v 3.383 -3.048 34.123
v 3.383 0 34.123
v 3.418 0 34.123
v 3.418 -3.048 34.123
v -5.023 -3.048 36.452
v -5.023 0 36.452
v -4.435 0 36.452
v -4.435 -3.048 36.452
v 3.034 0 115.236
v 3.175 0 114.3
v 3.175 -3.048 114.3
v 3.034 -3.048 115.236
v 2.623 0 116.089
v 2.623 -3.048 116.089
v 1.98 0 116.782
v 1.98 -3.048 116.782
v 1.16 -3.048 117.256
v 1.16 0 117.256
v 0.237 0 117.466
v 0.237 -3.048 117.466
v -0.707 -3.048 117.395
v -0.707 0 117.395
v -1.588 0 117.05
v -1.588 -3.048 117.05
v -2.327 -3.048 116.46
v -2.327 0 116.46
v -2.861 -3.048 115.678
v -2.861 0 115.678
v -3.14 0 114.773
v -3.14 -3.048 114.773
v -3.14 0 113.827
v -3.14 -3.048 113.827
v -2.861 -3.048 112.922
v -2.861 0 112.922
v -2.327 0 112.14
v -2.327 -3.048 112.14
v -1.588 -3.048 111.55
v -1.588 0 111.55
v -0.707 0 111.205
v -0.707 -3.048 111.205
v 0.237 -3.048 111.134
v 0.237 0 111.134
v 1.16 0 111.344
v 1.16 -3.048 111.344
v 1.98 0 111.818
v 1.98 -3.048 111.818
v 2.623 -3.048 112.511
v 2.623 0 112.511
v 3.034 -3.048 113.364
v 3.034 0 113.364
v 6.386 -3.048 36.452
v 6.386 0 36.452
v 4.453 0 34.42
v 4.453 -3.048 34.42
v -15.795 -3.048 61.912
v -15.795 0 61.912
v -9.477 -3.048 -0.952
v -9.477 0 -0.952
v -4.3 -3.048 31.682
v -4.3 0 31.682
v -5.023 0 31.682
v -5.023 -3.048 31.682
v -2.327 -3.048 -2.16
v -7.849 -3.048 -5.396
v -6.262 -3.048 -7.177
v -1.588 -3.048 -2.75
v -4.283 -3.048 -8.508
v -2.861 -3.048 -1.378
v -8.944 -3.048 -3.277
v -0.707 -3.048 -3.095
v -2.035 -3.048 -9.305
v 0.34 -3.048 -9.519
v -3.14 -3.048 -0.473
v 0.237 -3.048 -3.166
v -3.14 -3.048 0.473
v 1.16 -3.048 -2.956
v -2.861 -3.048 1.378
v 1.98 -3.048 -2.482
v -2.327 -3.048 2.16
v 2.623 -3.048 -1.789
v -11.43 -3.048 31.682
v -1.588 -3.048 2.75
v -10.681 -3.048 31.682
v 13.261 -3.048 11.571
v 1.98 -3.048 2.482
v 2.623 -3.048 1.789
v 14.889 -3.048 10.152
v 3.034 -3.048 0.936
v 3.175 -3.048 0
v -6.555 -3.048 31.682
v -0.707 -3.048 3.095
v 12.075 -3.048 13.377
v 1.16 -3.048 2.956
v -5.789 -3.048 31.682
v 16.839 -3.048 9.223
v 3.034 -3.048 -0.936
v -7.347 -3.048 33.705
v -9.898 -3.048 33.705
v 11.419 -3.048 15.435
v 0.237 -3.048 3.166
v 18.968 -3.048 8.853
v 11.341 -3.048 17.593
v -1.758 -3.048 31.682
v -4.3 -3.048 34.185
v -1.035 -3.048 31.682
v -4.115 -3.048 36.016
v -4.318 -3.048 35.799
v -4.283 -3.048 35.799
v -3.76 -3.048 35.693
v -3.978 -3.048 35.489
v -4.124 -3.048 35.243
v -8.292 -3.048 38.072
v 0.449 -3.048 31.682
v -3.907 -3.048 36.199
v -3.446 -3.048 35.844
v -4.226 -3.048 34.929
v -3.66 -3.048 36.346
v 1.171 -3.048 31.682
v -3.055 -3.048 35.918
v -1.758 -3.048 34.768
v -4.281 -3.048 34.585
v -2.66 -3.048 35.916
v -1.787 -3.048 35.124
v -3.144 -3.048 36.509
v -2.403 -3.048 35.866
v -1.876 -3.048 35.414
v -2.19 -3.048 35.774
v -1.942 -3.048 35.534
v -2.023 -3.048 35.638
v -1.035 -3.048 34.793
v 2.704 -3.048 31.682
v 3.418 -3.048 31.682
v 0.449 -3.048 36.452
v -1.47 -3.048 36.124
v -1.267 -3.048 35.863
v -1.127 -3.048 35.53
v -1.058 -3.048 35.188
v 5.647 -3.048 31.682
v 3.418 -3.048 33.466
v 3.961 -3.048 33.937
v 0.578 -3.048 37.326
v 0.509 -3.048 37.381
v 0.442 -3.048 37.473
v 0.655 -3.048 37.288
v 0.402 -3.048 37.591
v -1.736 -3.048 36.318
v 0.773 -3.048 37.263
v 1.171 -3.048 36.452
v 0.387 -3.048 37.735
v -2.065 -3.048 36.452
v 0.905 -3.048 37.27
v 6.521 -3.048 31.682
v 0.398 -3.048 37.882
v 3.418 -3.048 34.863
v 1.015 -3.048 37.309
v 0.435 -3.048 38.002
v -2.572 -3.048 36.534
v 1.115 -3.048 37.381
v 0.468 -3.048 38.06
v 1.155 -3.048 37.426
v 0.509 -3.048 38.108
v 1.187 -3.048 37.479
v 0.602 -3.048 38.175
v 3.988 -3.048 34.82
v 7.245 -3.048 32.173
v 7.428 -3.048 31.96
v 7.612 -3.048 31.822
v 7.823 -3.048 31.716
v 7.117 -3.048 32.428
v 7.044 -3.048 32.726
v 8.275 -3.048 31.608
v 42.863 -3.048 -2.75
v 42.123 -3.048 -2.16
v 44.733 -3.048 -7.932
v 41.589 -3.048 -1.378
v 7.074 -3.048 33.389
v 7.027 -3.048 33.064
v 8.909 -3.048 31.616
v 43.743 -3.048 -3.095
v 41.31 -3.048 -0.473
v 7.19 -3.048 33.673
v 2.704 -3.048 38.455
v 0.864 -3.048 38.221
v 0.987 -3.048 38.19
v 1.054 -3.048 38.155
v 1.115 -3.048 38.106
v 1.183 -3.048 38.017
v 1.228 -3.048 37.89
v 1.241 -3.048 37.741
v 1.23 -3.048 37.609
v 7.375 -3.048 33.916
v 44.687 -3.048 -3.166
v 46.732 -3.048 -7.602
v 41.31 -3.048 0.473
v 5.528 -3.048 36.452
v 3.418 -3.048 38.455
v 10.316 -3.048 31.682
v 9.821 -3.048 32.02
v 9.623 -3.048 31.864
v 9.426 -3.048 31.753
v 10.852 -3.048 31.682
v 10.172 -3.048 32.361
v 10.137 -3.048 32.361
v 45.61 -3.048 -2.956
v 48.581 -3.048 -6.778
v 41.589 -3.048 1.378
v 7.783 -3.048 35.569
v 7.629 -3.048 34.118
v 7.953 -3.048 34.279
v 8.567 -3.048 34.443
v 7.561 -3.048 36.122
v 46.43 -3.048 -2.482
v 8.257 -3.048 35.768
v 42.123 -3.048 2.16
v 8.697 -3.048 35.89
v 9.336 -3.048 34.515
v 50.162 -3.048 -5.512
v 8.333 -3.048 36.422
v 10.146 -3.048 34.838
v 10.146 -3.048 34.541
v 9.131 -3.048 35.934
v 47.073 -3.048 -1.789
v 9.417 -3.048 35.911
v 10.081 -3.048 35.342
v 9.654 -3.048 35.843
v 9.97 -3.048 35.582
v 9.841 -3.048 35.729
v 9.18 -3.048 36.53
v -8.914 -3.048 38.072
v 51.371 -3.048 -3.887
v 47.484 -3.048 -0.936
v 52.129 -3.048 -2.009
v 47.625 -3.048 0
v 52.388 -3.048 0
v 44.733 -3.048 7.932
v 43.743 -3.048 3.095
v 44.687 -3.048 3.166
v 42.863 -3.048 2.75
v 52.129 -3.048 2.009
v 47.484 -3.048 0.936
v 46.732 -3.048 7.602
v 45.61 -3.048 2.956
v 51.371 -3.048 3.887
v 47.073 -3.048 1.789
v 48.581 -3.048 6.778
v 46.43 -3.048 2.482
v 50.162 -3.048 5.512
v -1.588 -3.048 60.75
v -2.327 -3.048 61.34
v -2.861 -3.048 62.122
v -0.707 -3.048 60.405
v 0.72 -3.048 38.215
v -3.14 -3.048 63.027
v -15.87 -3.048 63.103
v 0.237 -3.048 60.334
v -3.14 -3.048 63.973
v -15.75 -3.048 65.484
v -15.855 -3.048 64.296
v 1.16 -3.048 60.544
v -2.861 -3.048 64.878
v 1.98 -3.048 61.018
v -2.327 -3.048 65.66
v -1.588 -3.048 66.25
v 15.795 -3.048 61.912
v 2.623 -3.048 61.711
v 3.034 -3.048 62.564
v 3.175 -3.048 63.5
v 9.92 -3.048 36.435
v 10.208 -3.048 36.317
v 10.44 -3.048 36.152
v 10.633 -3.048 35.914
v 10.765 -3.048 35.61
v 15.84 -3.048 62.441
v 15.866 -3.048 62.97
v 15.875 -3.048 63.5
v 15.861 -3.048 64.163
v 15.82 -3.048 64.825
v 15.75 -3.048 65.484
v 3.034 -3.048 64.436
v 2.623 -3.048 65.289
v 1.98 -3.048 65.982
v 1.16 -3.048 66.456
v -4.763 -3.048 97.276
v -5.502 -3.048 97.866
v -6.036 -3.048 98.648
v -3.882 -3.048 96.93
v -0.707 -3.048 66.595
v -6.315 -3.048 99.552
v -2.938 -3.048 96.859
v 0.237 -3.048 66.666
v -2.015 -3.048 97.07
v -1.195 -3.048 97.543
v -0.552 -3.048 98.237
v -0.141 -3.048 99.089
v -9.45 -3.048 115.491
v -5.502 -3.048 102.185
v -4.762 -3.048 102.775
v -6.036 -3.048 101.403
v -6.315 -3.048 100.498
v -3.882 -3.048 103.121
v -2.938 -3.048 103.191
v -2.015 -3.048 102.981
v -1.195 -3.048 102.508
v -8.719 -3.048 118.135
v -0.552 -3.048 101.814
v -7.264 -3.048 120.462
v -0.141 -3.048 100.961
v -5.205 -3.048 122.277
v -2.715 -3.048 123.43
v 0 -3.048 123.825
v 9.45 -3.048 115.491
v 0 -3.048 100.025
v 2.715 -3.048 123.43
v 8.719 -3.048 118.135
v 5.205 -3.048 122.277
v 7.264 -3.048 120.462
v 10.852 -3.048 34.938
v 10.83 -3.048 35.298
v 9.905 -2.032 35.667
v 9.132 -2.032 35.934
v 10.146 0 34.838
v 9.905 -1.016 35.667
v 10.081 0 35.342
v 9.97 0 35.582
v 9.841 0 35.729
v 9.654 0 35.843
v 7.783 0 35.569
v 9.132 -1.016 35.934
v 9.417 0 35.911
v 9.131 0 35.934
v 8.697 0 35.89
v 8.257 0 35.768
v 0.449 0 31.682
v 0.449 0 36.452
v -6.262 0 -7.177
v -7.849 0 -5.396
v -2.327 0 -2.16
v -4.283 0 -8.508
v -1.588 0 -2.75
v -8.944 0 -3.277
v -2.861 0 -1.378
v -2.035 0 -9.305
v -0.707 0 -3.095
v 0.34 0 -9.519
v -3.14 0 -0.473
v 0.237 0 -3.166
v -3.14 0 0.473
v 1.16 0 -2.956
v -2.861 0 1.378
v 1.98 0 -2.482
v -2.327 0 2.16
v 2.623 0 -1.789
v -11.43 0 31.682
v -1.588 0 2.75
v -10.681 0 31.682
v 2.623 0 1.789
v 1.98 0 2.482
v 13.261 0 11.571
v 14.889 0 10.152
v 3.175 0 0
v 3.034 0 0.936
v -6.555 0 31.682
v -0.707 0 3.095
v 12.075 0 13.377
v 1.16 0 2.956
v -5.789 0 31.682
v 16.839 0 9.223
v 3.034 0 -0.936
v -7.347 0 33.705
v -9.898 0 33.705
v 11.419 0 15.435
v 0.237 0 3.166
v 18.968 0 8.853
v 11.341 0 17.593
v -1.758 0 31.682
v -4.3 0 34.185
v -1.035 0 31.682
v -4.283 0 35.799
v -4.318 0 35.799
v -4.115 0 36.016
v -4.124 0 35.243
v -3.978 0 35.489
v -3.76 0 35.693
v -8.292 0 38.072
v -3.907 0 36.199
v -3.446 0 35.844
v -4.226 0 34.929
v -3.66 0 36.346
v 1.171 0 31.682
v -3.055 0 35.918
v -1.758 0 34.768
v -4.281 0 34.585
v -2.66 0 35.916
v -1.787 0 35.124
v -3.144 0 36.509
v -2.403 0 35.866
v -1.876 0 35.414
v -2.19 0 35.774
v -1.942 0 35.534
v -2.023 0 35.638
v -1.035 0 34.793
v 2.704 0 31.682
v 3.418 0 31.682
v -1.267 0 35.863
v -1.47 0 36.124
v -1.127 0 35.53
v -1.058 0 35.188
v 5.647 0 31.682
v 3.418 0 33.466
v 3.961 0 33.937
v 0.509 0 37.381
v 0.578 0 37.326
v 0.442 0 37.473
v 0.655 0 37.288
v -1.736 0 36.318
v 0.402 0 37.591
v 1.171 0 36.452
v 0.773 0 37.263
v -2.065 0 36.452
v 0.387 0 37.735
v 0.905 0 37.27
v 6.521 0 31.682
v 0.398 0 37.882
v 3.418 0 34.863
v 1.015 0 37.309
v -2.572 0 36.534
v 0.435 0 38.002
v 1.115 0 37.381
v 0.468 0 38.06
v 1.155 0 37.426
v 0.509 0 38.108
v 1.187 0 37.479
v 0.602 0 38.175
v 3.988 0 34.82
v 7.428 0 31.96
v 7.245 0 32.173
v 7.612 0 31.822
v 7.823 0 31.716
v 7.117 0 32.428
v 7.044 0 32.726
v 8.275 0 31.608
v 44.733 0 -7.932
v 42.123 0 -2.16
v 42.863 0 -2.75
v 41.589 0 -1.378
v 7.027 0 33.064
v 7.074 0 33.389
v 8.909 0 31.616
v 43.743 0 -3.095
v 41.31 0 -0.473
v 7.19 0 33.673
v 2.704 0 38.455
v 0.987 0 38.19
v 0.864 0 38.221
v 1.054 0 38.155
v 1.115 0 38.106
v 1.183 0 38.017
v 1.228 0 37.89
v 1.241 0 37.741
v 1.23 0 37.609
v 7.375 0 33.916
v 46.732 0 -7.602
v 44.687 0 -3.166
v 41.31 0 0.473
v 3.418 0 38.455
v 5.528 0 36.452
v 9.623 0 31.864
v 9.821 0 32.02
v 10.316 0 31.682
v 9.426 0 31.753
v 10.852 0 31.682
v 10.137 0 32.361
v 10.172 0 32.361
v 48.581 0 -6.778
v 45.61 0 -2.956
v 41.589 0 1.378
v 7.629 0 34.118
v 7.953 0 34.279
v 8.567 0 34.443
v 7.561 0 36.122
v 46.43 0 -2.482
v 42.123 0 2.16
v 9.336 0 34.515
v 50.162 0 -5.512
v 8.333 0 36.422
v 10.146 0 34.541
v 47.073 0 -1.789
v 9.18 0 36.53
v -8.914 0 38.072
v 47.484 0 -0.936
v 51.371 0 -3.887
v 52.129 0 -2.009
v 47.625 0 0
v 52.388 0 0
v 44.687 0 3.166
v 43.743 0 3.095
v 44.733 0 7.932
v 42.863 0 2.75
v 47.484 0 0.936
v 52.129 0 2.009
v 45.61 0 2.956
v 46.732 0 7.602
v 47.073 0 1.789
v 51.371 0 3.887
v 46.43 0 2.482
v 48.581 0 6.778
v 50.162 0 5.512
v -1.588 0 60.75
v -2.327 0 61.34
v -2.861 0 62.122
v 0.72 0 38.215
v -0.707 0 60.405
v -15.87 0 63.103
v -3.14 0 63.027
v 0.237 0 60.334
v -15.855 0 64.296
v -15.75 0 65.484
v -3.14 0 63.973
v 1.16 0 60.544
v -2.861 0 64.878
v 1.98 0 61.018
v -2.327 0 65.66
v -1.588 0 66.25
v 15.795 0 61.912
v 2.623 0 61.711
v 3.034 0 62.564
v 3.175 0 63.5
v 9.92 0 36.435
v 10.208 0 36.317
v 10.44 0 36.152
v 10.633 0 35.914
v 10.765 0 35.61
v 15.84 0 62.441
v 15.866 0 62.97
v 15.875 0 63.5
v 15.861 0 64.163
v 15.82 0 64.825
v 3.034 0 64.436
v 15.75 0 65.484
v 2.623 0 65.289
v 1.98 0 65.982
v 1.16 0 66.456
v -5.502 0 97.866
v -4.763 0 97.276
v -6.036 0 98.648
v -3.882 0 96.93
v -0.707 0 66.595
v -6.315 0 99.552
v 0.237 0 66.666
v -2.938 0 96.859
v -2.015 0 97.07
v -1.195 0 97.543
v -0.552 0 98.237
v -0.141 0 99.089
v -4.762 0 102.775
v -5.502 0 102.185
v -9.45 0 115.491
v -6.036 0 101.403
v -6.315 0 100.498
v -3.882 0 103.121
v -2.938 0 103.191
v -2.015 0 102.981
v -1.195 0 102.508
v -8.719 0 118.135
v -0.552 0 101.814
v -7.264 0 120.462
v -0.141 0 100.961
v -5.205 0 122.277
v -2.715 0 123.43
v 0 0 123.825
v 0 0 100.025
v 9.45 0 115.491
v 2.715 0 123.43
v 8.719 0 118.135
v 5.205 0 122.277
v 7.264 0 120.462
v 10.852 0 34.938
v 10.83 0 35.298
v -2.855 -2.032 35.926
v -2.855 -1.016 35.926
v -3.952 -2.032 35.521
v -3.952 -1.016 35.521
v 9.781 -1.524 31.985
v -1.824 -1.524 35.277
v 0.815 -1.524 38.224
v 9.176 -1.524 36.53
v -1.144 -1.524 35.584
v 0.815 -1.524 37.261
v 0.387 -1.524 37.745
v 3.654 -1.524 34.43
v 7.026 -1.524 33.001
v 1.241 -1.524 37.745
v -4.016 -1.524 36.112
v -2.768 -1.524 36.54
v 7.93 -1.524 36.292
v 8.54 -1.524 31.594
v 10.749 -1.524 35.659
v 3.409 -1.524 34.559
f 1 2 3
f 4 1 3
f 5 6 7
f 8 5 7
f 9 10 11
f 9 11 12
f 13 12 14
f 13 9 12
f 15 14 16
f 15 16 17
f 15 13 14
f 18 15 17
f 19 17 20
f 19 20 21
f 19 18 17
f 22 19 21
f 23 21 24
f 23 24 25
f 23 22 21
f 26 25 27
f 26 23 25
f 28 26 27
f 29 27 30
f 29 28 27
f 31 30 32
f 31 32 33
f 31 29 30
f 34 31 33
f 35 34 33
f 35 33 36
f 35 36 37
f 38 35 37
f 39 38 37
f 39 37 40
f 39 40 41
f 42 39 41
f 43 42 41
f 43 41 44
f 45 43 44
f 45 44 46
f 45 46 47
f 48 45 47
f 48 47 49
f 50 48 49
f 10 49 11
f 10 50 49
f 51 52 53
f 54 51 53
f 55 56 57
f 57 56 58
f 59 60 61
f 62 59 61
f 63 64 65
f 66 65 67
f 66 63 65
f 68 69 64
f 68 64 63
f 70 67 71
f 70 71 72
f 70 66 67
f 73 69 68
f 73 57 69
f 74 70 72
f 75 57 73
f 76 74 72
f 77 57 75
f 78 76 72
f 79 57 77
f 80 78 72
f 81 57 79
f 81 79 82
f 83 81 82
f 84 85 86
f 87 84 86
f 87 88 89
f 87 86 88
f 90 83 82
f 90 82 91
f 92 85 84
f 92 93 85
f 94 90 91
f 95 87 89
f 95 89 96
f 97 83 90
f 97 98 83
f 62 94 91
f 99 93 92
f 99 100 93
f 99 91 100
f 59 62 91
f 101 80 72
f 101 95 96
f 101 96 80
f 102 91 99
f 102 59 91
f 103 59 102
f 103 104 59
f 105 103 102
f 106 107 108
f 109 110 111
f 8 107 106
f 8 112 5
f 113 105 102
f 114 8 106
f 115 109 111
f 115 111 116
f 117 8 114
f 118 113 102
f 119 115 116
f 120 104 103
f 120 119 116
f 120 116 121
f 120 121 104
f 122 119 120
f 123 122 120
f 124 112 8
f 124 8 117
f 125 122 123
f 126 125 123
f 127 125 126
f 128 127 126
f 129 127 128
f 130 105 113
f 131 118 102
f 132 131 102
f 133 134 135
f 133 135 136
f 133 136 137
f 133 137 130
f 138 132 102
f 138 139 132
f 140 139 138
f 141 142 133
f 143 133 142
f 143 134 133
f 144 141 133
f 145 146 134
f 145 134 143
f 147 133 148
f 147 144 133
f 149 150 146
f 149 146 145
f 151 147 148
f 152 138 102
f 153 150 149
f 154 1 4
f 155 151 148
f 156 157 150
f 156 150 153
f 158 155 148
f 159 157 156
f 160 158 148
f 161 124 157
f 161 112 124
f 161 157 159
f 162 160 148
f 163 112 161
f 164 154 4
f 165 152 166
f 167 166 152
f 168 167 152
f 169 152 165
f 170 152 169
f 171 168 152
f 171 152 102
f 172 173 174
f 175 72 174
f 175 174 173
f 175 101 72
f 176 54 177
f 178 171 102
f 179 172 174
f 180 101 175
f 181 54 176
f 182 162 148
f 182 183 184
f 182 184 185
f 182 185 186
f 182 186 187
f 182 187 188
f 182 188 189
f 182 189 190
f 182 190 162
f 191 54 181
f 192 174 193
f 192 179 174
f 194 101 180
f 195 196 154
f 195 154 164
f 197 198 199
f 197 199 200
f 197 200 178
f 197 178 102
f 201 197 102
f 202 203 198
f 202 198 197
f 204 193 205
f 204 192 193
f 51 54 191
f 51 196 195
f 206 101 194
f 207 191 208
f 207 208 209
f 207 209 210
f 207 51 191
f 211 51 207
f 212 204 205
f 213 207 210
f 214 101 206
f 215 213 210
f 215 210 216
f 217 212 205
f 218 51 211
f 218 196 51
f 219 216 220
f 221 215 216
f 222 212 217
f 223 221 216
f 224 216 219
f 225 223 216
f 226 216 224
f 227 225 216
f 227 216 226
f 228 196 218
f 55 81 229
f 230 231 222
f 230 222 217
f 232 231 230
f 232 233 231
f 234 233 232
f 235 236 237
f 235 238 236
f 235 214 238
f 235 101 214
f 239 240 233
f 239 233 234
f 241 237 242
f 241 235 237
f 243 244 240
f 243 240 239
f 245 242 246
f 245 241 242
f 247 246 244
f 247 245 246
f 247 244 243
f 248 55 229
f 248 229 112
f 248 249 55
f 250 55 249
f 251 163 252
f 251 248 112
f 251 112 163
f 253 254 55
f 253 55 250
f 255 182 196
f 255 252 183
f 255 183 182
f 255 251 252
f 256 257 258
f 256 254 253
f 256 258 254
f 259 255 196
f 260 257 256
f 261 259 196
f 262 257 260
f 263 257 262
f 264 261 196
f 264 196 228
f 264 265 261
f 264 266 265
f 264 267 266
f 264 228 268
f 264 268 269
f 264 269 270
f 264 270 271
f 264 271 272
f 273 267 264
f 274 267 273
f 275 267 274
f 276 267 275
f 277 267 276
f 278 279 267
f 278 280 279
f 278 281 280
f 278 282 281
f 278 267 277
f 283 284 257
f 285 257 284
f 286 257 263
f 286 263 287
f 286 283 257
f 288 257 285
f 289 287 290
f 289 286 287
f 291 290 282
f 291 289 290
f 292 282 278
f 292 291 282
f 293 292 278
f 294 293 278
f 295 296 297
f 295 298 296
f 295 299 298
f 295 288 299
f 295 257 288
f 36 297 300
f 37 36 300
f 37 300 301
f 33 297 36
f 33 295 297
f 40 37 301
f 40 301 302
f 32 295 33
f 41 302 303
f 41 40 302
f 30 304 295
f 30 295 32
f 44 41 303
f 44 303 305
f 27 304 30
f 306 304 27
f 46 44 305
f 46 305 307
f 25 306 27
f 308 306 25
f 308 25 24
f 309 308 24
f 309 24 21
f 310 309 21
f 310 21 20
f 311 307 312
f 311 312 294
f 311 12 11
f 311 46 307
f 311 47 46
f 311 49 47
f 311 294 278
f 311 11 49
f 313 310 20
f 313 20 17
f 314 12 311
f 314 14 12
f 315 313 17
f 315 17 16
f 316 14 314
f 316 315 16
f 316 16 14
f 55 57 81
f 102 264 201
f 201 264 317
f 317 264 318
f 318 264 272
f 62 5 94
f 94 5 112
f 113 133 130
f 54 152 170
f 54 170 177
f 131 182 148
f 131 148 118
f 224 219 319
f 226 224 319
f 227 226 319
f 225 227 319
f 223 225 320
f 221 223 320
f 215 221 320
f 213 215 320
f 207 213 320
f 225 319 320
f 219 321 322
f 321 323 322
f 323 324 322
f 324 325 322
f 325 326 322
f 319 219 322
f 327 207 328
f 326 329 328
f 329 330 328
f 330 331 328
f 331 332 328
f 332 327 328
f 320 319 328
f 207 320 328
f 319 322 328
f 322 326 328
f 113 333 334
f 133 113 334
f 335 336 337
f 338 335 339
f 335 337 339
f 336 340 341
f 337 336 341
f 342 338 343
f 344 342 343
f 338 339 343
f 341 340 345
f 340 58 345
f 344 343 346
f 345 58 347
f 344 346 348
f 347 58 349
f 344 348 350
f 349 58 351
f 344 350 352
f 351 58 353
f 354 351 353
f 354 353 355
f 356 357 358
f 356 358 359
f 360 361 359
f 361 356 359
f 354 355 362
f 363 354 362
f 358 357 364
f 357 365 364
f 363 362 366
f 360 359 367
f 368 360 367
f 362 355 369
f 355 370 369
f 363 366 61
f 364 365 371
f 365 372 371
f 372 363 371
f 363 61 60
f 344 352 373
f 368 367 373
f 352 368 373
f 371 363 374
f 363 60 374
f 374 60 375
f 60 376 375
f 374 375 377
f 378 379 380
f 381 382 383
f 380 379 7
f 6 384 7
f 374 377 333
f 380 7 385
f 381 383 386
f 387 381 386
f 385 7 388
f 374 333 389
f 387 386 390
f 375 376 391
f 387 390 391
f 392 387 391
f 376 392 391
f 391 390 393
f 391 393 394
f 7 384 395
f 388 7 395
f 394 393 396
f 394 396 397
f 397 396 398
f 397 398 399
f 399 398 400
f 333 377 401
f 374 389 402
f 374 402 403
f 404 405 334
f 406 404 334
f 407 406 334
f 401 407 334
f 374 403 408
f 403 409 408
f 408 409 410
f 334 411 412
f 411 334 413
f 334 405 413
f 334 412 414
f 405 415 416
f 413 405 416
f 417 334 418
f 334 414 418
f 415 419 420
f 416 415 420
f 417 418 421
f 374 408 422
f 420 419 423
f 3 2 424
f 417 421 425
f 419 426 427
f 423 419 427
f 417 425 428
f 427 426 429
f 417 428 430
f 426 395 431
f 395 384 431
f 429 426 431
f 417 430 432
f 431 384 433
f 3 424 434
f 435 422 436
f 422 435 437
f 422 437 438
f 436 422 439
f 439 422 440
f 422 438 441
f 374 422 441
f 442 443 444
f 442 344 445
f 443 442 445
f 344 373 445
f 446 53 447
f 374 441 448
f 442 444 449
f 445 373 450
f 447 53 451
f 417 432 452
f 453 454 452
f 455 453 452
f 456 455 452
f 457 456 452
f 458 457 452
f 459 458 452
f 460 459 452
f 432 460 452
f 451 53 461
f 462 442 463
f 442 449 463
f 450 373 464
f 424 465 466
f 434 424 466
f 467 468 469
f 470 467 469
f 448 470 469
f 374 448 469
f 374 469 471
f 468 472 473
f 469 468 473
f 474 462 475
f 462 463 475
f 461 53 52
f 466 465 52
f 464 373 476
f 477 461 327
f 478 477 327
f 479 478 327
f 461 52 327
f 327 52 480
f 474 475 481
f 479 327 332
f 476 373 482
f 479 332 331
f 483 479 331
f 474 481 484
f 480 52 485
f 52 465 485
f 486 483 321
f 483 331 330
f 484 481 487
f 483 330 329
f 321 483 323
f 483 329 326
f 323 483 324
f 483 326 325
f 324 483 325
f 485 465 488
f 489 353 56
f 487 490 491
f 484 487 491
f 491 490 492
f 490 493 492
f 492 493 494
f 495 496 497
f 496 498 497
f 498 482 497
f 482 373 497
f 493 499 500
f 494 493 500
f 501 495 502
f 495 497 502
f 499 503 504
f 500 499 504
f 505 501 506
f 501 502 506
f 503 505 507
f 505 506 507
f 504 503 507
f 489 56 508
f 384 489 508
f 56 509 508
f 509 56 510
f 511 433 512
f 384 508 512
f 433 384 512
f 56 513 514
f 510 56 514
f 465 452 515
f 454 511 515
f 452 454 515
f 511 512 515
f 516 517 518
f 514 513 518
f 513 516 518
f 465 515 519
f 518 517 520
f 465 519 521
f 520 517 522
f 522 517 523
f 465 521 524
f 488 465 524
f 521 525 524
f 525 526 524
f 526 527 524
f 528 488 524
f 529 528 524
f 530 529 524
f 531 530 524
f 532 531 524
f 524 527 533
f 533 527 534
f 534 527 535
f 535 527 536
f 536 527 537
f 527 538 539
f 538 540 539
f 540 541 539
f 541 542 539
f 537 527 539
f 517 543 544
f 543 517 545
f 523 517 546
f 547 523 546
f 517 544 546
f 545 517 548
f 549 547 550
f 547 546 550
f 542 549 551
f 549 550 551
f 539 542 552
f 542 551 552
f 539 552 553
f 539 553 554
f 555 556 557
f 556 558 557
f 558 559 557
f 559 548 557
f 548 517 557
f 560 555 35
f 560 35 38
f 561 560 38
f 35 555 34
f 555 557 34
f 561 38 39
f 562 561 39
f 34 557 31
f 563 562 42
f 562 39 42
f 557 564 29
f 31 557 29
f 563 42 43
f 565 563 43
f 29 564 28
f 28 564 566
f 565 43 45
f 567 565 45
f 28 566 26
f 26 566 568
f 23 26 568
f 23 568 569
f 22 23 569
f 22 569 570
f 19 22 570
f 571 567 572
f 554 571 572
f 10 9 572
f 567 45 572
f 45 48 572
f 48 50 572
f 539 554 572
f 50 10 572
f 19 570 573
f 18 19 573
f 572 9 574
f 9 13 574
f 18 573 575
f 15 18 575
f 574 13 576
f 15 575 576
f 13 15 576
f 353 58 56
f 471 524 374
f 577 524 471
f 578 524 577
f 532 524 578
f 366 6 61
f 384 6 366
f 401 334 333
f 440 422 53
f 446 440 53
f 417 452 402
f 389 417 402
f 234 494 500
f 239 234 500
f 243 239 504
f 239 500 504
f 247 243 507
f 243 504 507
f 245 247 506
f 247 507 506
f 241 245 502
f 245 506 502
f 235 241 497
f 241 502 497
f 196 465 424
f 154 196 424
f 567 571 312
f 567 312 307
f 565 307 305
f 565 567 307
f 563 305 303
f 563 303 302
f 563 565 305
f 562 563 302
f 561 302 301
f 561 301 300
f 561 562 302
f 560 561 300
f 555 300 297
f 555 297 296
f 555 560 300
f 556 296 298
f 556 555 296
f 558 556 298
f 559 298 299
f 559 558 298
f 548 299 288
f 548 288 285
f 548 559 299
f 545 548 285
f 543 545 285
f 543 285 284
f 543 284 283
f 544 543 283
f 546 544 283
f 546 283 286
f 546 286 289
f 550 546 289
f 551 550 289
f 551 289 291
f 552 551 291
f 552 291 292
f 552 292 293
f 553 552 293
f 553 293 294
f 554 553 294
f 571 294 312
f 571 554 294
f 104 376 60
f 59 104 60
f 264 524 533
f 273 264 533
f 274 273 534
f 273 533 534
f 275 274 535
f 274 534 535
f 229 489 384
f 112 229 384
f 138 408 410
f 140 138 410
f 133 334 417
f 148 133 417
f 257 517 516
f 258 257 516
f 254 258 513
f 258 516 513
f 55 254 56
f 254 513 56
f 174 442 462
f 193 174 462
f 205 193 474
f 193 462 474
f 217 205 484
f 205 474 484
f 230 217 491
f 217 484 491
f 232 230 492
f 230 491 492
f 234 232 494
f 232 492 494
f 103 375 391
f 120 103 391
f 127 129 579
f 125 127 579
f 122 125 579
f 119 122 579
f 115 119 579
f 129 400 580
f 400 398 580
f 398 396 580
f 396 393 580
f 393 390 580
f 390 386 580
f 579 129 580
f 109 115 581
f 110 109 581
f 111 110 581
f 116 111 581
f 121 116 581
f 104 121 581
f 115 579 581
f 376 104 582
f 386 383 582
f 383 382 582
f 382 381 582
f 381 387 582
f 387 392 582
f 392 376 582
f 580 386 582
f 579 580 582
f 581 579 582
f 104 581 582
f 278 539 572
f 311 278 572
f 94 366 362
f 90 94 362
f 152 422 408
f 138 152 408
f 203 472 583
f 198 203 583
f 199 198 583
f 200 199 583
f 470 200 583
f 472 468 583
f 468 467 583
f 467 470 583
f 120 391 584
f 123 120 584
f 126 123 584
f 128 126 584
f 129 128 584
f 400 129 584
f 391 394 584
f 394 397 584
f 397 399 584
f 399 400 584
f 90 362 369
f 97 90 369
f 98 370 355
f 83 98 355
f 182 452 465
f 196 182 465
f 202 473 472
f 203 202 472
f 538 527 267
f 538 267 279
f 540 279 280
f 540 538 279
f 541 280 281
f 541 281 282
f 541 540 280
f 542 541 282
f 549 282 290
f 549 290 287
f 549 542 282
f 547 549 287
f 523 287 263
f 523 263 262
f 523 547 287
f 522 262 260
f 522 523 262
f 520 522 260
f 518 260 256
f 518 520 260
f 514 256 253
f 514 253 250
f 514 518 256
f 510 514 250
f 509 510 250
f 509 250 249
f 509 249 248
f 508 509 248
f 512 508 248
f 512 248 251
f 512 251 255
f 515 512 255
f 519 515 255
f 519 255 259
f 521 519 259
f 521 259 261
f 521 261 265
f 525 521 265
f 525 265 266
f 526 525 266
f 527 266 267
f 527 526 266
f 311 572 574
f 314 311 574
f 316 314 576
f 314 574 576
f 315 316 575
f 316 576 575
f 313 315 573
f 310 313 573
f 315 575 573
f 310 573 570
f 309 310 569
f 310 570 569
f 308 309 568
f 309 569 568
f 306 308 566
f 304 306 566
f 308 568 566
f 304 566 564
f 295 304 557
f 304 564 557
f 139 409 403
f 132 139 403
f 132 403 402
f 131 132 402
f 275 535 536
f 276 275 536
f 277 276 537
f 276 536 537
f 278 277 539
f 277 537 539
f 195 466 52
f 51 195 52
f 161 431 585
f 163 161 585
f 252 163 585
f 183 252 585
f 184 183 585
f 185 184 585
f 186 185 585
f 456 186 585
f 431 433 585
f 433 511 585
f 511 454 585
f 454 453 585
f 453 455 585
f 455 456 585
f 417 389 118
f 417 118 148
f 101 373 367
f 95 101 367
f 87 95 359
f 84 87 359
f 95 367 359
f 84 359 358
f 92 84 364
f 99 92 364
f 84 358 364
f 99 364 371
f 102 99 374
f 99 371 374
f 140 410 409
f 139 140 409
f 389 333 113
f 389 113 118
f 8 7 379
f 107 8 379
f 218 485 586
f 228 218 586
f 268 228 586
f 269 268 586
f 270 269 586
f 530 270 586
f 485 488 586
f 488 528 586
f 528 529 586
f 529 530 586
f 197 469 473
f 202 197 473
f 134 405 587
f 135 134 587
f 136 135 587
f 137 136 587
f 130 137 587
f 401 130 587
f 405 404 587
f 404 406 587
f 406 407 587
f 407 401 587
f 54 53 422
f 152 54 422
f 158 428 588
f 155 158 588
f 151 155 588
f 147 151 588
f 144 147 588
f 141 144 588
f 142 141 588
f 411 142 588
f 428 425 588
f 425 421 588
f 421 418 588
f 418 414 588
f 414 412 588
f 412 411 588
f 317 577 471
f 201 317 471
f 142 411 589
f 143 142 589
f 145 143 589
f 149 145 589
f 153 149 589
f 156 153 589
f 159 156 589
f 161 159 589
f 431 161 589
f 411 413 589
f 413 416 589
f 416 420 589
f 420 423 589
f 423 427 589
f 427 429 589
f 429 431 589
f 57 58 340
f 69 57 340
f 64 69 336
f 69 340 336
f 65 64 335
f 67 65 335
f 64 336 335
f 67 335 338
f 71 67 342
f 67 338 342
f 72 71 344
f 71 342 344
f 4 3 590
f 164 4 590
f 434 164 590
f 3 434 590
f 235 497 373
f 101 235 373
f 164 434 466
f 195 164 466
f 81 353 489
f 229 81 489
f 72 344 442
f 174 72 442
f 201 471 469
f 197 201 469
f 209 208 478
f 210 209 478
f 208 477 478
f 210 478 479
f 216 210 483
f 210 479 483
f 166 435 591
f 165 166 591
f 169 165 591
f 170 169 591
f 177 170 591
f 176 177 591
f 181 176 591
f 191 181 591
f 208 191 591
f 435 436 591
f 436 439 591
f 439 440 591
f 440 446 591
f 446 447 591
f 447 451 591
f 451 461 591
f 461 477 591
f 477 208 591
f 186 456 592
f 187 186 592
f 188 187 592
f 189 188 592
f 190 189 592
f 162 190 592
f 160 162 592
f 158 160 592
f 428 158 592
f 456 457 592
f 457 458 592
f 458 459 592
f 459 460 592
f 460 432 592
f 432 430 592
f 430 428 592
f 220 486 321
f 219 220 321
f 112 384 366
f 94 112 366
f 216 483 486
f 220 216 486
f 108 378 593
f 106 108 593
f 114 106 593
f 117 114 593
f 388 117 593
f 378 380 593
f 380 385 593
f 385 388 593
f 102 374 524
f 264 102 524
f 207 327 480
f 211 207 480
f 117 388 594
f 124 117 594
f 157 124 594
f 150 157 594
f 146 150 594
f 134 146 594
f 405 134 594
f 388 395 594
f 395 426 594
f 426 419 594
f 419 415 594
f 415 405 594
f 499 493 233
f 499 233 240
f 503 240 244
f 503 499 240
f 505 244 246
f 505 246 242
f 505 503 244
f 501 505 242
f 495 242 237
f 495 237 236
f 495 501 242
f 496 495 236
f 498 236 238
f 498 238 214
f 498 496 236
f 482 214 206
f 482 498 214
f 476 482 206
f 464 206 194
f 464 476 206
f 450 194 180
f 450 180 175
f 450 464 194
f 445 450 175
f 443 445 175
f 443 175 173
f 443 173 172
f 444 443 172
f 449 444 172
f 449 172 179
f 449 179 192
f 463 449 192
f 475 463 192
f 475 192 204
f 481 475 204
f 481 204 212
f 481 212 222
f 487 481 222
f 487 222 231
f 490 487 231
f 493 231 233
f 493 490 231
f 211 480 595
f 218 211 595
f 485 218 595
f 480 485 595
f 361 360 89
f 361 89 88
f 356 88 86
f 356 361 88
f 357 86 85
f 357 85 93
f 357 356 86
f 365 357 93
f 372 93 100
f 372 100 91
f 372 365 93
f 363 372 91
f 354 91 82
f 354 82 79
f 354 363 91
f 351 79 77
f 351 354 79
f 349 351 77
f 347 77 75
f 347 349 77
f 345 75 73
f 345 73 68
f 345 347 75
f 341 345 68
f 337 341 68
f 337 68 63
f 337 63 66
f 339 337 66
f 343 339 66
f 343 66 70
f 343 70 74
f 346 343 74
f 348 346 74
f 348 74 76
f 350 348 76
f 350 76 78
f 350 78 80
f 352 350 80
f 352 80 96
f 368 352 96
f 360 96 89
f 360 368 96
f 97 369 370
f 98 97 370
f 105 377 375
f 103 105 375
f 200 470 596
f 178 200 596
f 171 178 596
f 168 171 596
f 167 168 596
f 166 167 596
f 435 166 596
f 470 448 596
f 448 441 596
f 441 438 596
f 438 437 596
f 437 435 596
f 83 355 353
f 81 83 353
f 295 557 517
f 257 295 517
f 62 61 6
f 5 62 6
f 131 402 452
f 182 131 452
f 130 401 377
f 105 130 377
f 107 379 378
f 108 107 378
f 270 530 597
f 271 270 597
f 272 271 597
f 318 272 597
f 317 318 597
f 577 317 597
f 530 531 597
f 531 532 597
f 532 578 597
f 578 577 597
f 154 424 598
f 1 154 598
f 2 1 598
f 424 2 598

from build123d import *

# Parameters (mm, degrees)
F0_R     = 3.175
F0_W     = 0.7229064099
F0_H     = 4.7706251523
F1_DEPTH = 3.048


with BuildPart() as f1:
    # F0 (on Front) → F1 (new body)
    with BuildSketch(Plane.XZ):
        with BuildLine():
            ThreePointArc((-9.4502929642, 115.490625), (-0.596483242, 104.7936951058), (9.525, 114.3))
            ThreePointArc((9.525, 114.3), (9.5063048942, 114.896483242), (9.4502929642, 115.490625))
            ThreePointArc((9.4502929642, 115.490625), (0, 123.825), (-9.4502929642, 115.490625))
        make_face()
        with Locations((0, 114.3)):
            Circle(F0_R, mode=Mode.SUBTRACT)
        with BuildLine():
            ThreePointArc((9.4502929642, 115.490625), (9.5063048942, 114.896483242), (9.525, 114.3))
            ThreePointArc((9.525, 114.3), (-0.596483242, 104.7936951058), (-9.4502929642, 115.490625))
            Line((-9.4502929642, 115.490625), (-15.7504882737, 65.484375))
            ThreePointArc((-15.7504882737, 65.484375), (0, 79.375), (15.7504882737, 65.484375))
            Line((15.7504882737, 65.484375), (9.4502929642, 115.490625))
        make_face()
        with Locations((-3.175, 100.0252)):
            Circle(F0_R, mode=Mode.SUBTRACT)
        with BuildLine():
            ThreePointArc((15.875, 63.5), (15.8438414904, 64.4941387366), (15.7504882737, 65.484375))
            ThreePointArc((15.7504882737, 65.484375), (0, 79.375), (-15.7504882737, 65.484375))
            ThreePointArc((-15.7504882737, 65.484375), (-15.8737438155, 63.6997054867), (-15.7954255641, 61.9125))
            ThreePointArc((-15.7954255641, 61.9125), (0, 47.625), (15.7954255641, 61.9125))
            ThreePointArc((15.7954255641, 61.9125), (15.8550939106, 62.7052534459), (15.875, 63.5))
        make_face()
        with Locations((0, 63.5)):
            Circle(F0_R, mode=Mode.SUBTRACT)
        with BuildLine():
            ThreePointArc((15.7954255641, 61.9125), (0, 47.625), (-15.7954255641, 61.9125))
            Line((-15.7954255641, 61.9125), (-9.4772553384, -0.9525))
            ThreePointArc((-9.4772553384, -0.9525), (-0.4768479324, 9.5130563464), (9.525, 0))
            ThreePointArc((9.525, 0), (6.8544082857, -6.6138273378), (0.3401785714, -9.5189234444))
            Line((0.3401785714, -9.5189234444), (44.7334821429, -7.9324362036))
            ThreePointArc((44.7334821429, -7.9324362036), (36.5125, 0), (44.7334821429, 7.9324362036))
            Line((44.7334821429, 7.9324362036), (18.9676000005, 8.8532337108))
            ThreePointArc((18.9676000005, 8.8532337108), (13.2611998974, 11.5713591498), (11.3411865923, 17.5933818124))
            Line((11.3411865923, 17.5933818124), (15.7954255641, 61.9125))
        make_face()
        Polygon((-5.7888228126, 31.6815939556), (-6.5549086035, 31.6815939556), (-7.3474591762, 33.7054533268), (-9.8978284182, 33.7054533268), (-10.6806288082, 31.6815939556), (-11.43, 31.6815939556), (-8.9144528394, 38.0721423349), (-8.2918340239, 38.0721423349), align=None, mode=Mode.SUBTRACT)
        with BuildLine():
            Line((-1.0349122593, 31.6815939556), (-1.7578186693, 31.6815939556))
            Line((-1.7578186693, 31.6815939556), (-1.7578186693, 34.7682232513))
            add(Edge.make_bspline(
                [(-1.7578186693, 34.7682232513), (-1.7578186693, 35.3504484524), (-2.0231629296, 35.6380788447)],
                knots=[0, 0, 0, 1, 1, 1], degree=2))
            add(Edge.make_bspline(
                [(-2.0231629296, 35.6380788447), (-2.2885071899, 35.9257092371), (-2.8554106751, 35.9257092371)],
                knots=[0, 0, 0, 1, 1, 1], degree=2))
            add(Edge.make_bspline(
                [(-2.8554106751, 35.9257092371), (-3.6033889837, 35.9257092371), (-3.9516097977, 35.5210766512)],
                knots=[0, 0, 0, 1, 1, 1], degree=2))
            add(Edge.make_bspline(
                [(-3.9516097977, 35.5210766512), (-4.2998306117, 35.1164440653), (-4.2998306117, 34.184605167)],
                knots=[0, 0, 0, 1, 1, 1], degree=2))
            Line((-4.2998306117, 34.184605167), (-4.2998306117, 31.6815939556))
            Line((-4.2998306117, 31.6815939556), (-5.0227370217, 31.6815939556))
            Line((-5.0227370217, 31.6815939556), (-5.0227370217, 36.452219108))
            Line((-5.0227370217, 36.452219108), (-4.4349402876, 36.452219108))
            Line((-4.4349402876, 36.452219108), (-4.3179380941, 35.7989568608))
            Line((-4.3179380941, 35.7989568608), (-4.2831160127, 35.7989568608))
            add(Edge.make_bspline(
                [(-4.2831160127, 35.7989568608), (-4.0602546917, 36.1513563246), (-3.6598007555, 36.3456635389)],
                knots=[0, 0, 0, 1, 1, 1], degree=2))
            add(Edge.make_bspline(
                [(-3.6598007555, 36.3456635389), (-3.2593468194, 36.5399707531), (-2.76765903, 36.5399707531)],
                knots=[0, 0, 0, 1, 1, 1], degree=2))
            add(Edge.make_bspline(
                [(-2.76765903, 36.5399707531), (-1.9054642944, 36.5399707531), (-1.4701882769, 36.1241951011)],
                knots=[0, 0, 0, 1, 1, 1], degree=2))
            add(Edge.make_bspline(
                [(-1.4701882769, 36.1241951011), (-1.0349122593, 35.7084194492), (-1.0349122593, 34.7932951499)],
                knots=[0, 0, 0, 1, 1, 1], degree=2))
            Line((-1.0349122593, 34.7932951499), (-1.0349122593, 31.6815939556))
        make_face(mode=Mode.SUBTRACT)
        with Locations((0.8099616135, 34.0669065318)):
            Rectangle(F0_W, F0_H, mode=Mode.SUBTRACT)
        with BuildLine():
            add(Edge.make_bspline(
                [(0.5090988301, 37.3812722398), (0.3872215452, 37.5010601999), (0.3872215452, 37.7448147697)],
                knots=[0, 0, 0, 1, 1, 1], degree=2))
            add(Edge.make_bspline(
                [(0.3872215452, 37.7448147697), (0.3872215452, 37.9927479893), (0.5090988301, 38.1083572995)],
                knots=[0, 0, 0, 1, 1, 1], degree=2))
            add(Edge.make_bspline(
                [(0.5090988301, 38.1083572995), (0.630976115, 38.2239666098), (0.8148367049, 38.2239666098)],
                knots=[0, 0, 0, 1, 1, 1], degree=2))
            add(Edge.make_bspline(
                [(0.8148367049, 38.2239666098), (0.9889471119, 38.2239666098), (1.1150030466, 38.1062679747)],
                knots=[0, 0, 0, 1, 1, 1], degree=2))
            add(Edge.make_bspline(
                [(1.1150030466, 38.1062679747), (1.2410589812, 37.9885693395), (1.2410589812, 37.7448147697)],
                knots=[0, 0, 0, 1, 1, 1], degree=2))
            add(Edge.make_bspline(
                [(1.2410589812, 37.7448147697), (1.2410589812, 37.5010601999), (1.1150030466, 37.3812722398)],
                knots=[0, 0, 0, 1, 1, 1], degree=2))
            add(Edge.make_bspline(
                [(1.1150030466, 37.3812722398), (0.9889471119, 37.2614842798), (0.8148367049, 37.2614842798)],
                knots=[0, 0, 0, 1, 1, 1], degree=2))
            add(Edge.make_bspline(
                [(0.8148367049, 37.2614842798), (0.630976115, 37.2614842798), (0.5090988301, 37.3812722398)],
                knots=[0, 0, 0, 1, 1, 1], degree=2))
        make_face(mode=Mode.SUBTRACT)
        with BuildLine():
            Line((3.3833134292, 34.1233183037), (3.4181355106, 34.1233183037))
            add(Edge.make_bspline(
                [(3.4181355106, 34.1233183037), (3.6047818669, 34.3893590056), (3.9878247624, 34.8197599318)],
                knots=[0, 0, 0, 1, 1, 1], degree=2))
            Line((3.9878247624, 34.8197599318), (5.5283536437, 36.452219108))
            Line((5.5283536437, 36.452219108), (6.3863697295, 36.452219108))
            Line((6.3863697295, 36.452219108), (4.4530477699, 34.4200024372))
            Line((4.4530477699, 34.4200024372), (6.5214794053, 31.6815939556))
            Line((6.5214794053, 31.6815939556), (5.6467487204, 31.6815939556))
            Line((5.6467487204, 31.6815939556), (3.9613599805, 33.9366719474))
            Line((3.9613599805, 33.9366719474), (3.4181355106, 33.4658774068))
            Line((3.4181355106, 33.4658774068), (3.4181355106, 31.6815939556))
            Line((3.4181355106, 31.6815939556), (2.7035864002, 31.6815939556))
            Line((2.7035864002, 31.6815939556), (2.7035864002, 38.4551852303))
            Line((2.7035864002, 38.4551852303), (3.4181355106, 38.4551852303))
            Line((3.4181355106, 38.4551852303), (3.4181355106, 34.8629393127))
            add(Edge.make_bspline(
                [(3.4181355106, 34.8629393127), (3.4181355106, 34.6247562759), (3.3833134292, 34.1233183037)],
                knots=[0, 0, 0, 1, 1, 1], degree=2))
        make_face(mode=Mode.SUBTRACT)
        with BuildLine():
            Line((10.8519534487, 31.6815939556), (10.3156933951, 31.6815939556))
            Line((10.3156933951, 31.6815939556), (10.1722264197, 32.3613209846))
            Line((10.1722264197, 32.3613209846), (10.1374043383, 32.3613209846))
            add(Edge.make_bspline(
                [(10.1374043383, 32.3613209846), (9.7808262247, 31.9128125762), (9.426337436, 31.7533274433)],
                knots=[0, 0, 0, 1, 1, 1], degree=2))
            add(Edge.make_bspline(
                [(9.426337436, 31.7533274433), (9.0718486473, 31.5938423105), (8.5397672435, 31.5938423105)],
                knots=[0, 0, 0, 1, 1, 1], degree=2))
            add(Edge.make_bspline(
                [(8.5397672435, 31.5938423105), (7.8307896661, 31.5938423105), (7.4282464051, 31.9601706069)],
                knots=[0, 0, 0, 1, 1, 1], degree=2))
            add(Edge.make_bspline(
                [(7.4282464051, 31.9601706069), (7.025703144, 32.3264989032), (7.025703144, 33.0006543992)],
                knots=[0, 0, 0, 1, 1, 1], degree=2))
            add(Edge.make_bspline(
                [(7.025703144, 33.0006543992), (7.025703144, 34.4450743359), (9.336496466, 34.5147184987)],
                knots=[0, 0, 0, 1, 1, 1], degree=2))
            Line((9.336496466, 34.5147184987), (10.1457616378, 34.5411832805))
            Line((10.1457616378, 34.5411832805), (10.1457616378, 34.8378674141))
            add(Edge.make_bspline(
                [(10.1457616378, 34.8378674141), (10.1457616378, 35.3991993663), (9.9047928345, 35.6666329515)],
                knots=[0, 0, 0, 1, 1, 1], degree=2))
            add(Edge.make_bspline(
                [(9.9047928345, 35.6666329515), (9.6638240312, 35.9340665367), (9.1317426273, 35.9340665367)],
                knots=[0, 0, 0, 1, 1, 1], degree=2))
            add(Edge.make_bspline(
                [(9.1317426273, 35.9340665367), (8.5355885937, 35.9340665367), (7.7834316354, 35.5691311236)],
                knots=[0, 0, 0, 1, 1, 1], degree=2))
            Line((7.7834316354, 35.5691311236), (7.5605703144, 36.1221057763))
            add(Edge.make_bspline(
                [(7.5605703144, 36.1221057763), (7.9129697782, 36.3129307824), (8.3329240799, 36.4215756763)],
                knots=[0, 0, 0, 1, 1, 1], degree=2))
            add(Edge.make_bspline(
                [(8.3329240799, 36.4215756763), (8.7528783817, 36.5302205703), (9.1763148915, 36.5302205703)],
                knots=[0, 0, 0, 1, 1, 1], degree=2))
            add(Edge.make_bspline(
                [(9.1763148915, 36.5302205703), (10.0287594443, 36.5302205703), (10.4403564465, 36.1520527663)],
                knots=[0, 0, 0, 1, 1, 1], degree=2))
            add(Edge.make_bspline(
                [(10.4403564465, 36.1520527663), (10.8519534487, 35.7738849622), (10.8519534487, 34.9381550085)],
                knots=[0, 0, 0, 1, 1, 1], degree=2))
            Line((10.8519534487, 34.9381550085), (10.8519534487, 31.6815939556))
        make_face(mode=Mode.SUBTRACT)
        with BuildLine():
            ThreePointArc((9.525, 0), (-0.4768479324, 9.5130563464), (-9.4772553384, -0.9525))
            ThreePointArc((-9.4772553384, -0.9525), (-6.2623833816, -7.1769199091), (0.3401785714, -9.5189234444))
            ThreePointArc((0.3401785714, -9.5189234444), (6.8544082857, -6.6138273378), (9.525, 0))
        make_face()
        Circle(F0_R, mode=Mode.SUBTRACT)
        with BuildLine():
            ThreePointArc((44.7334821429, 7.9324362036), (36.5125, 0), (44.7334821429, -7.9324362036))
            ThreePointArc((44.7334821429, -7.9324362036), (50.1620069047, -5.5115227815), (52.3875, 0))
            ThreePointArc((52.3875, 0), (50.1620069047, 5.5115227815), (44.7334821429, 7.9324362036))
        make_face()
        with Locations((44.45, 0)):
            Circle(F0_R, mode=Mode.SUBTRACT)
    extrude(amount=F1_DEPTH)


solid = f1.part
